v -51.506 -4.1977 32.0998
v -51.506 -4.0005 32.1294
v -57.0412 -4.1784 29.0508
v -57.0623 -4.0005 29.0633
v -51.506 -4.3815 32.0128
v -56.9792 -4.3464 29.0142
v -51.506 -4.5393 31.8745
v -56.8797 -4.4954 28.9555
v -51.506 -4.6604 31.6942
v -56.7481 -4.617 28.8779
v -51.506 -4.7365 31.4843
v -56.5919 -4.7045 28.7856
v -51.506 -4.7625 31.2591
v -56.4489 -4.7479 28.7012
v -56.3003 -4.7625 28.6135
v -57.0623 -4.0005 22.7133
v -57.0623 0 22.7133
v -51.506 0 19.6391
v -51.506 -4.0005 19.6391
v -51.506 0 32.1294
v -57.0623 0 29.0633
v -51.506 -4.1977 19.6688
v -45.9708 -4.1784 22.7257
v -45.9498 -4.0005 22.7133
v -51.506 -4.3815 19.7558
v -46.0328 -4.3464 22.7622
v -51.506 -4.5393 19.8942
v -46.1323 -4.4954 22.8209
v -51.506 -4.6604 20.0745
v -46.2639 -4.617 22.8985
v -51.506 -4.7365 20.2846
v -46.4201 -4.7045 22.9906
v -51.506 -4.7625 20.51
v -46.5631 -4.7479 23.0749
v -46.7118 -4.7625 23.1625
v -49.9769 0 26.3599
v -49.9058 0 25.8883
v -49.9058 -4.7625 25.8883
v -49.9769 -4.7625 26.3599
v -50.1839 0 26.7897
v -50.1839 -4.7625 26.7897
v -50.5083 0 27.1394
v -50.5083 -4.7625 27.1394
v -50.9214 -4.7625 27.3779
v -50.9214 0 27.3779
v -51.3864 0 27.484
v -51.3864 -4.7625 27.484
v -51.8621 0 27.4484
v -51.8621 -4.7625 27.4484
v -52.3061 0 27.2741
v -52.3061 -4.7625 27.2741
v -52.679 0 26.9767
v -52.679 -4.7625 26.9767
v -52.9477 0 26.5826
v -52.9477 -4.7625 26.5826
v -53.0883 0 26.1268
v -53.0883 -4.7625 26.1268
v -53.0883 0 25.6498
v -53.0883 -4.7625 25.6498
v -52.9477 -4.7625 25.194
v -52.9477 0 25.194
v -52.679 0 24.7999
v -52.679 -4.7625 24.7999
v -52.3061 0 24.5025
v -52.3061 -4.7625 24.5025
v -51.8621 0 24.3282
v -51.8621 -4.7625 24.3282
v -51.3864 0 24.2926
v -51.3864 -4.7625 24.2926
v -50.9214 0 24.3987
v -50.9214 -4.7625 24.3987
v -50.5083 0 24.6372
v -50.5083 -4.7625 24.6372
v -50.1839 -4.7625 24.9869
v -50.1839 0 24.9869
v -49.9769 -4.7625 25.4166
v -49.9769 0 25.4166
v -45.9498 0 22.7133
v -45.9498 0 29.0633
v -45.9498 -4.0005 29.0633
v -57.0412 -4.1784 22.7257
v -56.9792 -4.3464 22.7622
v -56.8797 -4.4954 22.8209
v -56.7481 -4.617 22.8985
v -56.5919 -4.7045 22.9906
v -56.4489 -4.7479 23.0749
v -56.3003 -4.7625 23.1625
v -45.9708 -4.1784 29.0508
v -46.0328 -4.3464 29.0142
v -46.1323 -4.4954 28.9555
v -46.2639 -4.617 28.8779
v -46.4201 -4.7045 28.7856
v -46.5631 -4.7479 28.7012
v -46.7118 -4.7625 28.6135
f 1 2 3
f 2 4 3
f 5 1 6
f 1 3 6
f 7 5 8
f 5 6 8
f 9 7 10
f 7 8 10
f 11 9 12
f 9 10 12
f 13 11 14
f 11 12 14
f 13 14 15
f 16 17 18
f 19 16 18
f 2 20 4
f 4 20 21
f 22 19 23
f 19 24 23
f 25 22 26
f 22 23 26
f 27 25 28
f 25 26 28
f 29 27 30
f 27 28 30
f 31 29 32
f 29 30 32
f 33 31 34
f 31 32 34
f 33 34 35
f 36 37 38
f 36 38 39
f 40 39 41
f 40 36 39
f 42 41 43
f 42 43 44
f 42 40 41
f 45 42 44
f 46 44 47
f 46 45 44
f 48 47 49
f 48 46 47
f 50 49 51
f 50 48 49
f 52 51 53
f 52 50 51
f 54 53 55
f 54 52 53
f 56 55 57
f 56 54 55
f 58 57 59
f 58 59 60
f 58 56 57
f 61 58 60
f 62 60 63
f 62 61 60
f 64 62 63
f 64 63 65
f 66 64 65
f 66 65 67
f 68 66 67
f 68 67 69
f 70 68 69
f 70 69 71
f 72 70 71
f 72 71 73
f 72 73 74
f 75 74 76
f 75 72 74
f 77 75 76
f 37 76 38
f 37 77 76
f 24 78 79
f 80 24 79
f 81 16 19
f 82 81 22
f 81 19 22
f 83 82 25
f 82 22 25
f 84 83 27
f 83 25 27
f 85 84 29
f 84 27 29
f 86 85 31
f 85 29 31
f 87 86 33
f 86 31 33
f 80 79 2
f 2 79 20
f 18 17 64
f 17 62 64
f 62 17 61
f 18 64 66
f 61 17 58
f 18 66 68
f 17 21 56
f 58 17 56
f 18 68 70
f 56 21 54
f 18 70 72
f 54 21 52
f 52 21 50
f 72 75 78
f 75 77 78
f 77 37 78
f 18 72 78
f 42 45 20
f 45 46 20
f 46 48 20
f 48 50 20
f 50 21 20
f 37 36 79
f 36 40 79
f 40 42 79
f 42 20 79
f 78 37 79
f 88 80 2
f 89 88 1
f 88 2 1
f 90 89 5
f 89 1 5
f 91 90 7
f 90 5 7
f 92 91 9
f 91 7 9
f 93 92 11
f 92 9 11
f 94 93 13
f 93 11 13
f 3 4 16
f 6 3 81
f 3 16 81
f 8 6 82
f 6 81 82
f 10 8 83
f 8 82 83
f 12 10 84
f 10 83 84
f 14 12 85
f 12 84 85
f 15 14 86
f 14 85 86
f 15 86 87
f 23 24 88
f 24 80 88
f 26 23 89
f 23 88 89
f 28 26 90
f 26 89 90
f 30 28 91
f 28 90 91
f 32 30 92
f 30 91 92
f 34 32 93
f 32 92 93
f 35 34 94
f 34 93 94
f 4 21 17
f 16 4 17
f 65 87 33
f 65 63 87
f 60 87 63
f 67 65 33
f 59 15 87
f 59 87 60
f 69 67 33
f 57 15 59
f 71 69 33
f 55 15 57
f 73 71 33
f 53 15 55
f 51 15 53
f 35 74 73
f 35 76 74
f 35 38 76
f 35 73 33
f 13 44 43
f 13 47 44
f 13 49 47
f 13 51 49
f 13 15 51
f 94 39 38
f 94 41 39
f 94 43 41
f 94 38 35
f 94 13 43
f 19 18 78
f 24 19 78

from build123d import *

# Parameters (mm, degrees)
F1_DEPTH = 9.525
F3_R     = 1.6002
F4_DEPTH = 4.7625
F5_R     = 0.762


with BuildPart() as f1:
    # F0 (on Front) → F1 (new body)
    with BuildSketch(Plane.XZ):
        Polygon((-47.0958250334, 35.7042094693), (-47.0958250334, 38.9427094693), (-43.8573250334, 38.9427094693), (-43.8573250334, 41.6986094693), (-49.5457097801, 38.8764154693), (-49.5457097801, 32.5264154693), (-43.8573250334, 29.7042214693), (-43.8573250334, 32.4657094693), (-47.0958250334, 32.4657094693), align=None)
        Polygon((-43.8573250334, 41.6986094693), (-43.8573250334, 38.9427094693), (-40.6188250334, 38.9427094693), (-40.6188250334, 35.7042094693), (-40.6188250334, 32.4657094693), (-43.8573250334, 32.4657094693), (-43.8573250334, 29.7042214693), (-38.1689402867, 32.5264154693), (-38.1689402867, 38.8764154693), align=None)
    extrude(amount=F1_DEPTH)


with BuildPart() as f4:
    # F3 (on Front) → F4 (new body)
    with BuildSketch(Plane.XZ):
        Polygon((-51.5060001731, 32.1294106543), (-57.0622501731, 29.0632774889), (-57.0622501731, 22.7132774889), (-51.5060001731, 19.6390969579), (-45.9497501731, 22.7132774889), (-45.9497501731, 29.0632774889), align=None)
        with Locations((-51.5060001731, 25.8882774889)):
            Circle(F3_R, mode=Mode.SUBTRACT)
    extrude(amount=F4_DEPTH)

    # F5
    f5_edges = [f4.edges().sort_by_distance(p)[0] for p in [
        (-54.284125, -4.7625, 30.596344),
        (-57.06225, -4.7625, 25.888277),
        (-54.284125, -4.7625, 21.176187),
        (-48.727875, -4.7625, 21.176187),
        (-45.94975, -4.7625, 25.888277),
        (-48.727875, -4.7625, 30.596344),
    ]]
    fillet(f5_edges, radius=F5_R)


solid = f4.part
